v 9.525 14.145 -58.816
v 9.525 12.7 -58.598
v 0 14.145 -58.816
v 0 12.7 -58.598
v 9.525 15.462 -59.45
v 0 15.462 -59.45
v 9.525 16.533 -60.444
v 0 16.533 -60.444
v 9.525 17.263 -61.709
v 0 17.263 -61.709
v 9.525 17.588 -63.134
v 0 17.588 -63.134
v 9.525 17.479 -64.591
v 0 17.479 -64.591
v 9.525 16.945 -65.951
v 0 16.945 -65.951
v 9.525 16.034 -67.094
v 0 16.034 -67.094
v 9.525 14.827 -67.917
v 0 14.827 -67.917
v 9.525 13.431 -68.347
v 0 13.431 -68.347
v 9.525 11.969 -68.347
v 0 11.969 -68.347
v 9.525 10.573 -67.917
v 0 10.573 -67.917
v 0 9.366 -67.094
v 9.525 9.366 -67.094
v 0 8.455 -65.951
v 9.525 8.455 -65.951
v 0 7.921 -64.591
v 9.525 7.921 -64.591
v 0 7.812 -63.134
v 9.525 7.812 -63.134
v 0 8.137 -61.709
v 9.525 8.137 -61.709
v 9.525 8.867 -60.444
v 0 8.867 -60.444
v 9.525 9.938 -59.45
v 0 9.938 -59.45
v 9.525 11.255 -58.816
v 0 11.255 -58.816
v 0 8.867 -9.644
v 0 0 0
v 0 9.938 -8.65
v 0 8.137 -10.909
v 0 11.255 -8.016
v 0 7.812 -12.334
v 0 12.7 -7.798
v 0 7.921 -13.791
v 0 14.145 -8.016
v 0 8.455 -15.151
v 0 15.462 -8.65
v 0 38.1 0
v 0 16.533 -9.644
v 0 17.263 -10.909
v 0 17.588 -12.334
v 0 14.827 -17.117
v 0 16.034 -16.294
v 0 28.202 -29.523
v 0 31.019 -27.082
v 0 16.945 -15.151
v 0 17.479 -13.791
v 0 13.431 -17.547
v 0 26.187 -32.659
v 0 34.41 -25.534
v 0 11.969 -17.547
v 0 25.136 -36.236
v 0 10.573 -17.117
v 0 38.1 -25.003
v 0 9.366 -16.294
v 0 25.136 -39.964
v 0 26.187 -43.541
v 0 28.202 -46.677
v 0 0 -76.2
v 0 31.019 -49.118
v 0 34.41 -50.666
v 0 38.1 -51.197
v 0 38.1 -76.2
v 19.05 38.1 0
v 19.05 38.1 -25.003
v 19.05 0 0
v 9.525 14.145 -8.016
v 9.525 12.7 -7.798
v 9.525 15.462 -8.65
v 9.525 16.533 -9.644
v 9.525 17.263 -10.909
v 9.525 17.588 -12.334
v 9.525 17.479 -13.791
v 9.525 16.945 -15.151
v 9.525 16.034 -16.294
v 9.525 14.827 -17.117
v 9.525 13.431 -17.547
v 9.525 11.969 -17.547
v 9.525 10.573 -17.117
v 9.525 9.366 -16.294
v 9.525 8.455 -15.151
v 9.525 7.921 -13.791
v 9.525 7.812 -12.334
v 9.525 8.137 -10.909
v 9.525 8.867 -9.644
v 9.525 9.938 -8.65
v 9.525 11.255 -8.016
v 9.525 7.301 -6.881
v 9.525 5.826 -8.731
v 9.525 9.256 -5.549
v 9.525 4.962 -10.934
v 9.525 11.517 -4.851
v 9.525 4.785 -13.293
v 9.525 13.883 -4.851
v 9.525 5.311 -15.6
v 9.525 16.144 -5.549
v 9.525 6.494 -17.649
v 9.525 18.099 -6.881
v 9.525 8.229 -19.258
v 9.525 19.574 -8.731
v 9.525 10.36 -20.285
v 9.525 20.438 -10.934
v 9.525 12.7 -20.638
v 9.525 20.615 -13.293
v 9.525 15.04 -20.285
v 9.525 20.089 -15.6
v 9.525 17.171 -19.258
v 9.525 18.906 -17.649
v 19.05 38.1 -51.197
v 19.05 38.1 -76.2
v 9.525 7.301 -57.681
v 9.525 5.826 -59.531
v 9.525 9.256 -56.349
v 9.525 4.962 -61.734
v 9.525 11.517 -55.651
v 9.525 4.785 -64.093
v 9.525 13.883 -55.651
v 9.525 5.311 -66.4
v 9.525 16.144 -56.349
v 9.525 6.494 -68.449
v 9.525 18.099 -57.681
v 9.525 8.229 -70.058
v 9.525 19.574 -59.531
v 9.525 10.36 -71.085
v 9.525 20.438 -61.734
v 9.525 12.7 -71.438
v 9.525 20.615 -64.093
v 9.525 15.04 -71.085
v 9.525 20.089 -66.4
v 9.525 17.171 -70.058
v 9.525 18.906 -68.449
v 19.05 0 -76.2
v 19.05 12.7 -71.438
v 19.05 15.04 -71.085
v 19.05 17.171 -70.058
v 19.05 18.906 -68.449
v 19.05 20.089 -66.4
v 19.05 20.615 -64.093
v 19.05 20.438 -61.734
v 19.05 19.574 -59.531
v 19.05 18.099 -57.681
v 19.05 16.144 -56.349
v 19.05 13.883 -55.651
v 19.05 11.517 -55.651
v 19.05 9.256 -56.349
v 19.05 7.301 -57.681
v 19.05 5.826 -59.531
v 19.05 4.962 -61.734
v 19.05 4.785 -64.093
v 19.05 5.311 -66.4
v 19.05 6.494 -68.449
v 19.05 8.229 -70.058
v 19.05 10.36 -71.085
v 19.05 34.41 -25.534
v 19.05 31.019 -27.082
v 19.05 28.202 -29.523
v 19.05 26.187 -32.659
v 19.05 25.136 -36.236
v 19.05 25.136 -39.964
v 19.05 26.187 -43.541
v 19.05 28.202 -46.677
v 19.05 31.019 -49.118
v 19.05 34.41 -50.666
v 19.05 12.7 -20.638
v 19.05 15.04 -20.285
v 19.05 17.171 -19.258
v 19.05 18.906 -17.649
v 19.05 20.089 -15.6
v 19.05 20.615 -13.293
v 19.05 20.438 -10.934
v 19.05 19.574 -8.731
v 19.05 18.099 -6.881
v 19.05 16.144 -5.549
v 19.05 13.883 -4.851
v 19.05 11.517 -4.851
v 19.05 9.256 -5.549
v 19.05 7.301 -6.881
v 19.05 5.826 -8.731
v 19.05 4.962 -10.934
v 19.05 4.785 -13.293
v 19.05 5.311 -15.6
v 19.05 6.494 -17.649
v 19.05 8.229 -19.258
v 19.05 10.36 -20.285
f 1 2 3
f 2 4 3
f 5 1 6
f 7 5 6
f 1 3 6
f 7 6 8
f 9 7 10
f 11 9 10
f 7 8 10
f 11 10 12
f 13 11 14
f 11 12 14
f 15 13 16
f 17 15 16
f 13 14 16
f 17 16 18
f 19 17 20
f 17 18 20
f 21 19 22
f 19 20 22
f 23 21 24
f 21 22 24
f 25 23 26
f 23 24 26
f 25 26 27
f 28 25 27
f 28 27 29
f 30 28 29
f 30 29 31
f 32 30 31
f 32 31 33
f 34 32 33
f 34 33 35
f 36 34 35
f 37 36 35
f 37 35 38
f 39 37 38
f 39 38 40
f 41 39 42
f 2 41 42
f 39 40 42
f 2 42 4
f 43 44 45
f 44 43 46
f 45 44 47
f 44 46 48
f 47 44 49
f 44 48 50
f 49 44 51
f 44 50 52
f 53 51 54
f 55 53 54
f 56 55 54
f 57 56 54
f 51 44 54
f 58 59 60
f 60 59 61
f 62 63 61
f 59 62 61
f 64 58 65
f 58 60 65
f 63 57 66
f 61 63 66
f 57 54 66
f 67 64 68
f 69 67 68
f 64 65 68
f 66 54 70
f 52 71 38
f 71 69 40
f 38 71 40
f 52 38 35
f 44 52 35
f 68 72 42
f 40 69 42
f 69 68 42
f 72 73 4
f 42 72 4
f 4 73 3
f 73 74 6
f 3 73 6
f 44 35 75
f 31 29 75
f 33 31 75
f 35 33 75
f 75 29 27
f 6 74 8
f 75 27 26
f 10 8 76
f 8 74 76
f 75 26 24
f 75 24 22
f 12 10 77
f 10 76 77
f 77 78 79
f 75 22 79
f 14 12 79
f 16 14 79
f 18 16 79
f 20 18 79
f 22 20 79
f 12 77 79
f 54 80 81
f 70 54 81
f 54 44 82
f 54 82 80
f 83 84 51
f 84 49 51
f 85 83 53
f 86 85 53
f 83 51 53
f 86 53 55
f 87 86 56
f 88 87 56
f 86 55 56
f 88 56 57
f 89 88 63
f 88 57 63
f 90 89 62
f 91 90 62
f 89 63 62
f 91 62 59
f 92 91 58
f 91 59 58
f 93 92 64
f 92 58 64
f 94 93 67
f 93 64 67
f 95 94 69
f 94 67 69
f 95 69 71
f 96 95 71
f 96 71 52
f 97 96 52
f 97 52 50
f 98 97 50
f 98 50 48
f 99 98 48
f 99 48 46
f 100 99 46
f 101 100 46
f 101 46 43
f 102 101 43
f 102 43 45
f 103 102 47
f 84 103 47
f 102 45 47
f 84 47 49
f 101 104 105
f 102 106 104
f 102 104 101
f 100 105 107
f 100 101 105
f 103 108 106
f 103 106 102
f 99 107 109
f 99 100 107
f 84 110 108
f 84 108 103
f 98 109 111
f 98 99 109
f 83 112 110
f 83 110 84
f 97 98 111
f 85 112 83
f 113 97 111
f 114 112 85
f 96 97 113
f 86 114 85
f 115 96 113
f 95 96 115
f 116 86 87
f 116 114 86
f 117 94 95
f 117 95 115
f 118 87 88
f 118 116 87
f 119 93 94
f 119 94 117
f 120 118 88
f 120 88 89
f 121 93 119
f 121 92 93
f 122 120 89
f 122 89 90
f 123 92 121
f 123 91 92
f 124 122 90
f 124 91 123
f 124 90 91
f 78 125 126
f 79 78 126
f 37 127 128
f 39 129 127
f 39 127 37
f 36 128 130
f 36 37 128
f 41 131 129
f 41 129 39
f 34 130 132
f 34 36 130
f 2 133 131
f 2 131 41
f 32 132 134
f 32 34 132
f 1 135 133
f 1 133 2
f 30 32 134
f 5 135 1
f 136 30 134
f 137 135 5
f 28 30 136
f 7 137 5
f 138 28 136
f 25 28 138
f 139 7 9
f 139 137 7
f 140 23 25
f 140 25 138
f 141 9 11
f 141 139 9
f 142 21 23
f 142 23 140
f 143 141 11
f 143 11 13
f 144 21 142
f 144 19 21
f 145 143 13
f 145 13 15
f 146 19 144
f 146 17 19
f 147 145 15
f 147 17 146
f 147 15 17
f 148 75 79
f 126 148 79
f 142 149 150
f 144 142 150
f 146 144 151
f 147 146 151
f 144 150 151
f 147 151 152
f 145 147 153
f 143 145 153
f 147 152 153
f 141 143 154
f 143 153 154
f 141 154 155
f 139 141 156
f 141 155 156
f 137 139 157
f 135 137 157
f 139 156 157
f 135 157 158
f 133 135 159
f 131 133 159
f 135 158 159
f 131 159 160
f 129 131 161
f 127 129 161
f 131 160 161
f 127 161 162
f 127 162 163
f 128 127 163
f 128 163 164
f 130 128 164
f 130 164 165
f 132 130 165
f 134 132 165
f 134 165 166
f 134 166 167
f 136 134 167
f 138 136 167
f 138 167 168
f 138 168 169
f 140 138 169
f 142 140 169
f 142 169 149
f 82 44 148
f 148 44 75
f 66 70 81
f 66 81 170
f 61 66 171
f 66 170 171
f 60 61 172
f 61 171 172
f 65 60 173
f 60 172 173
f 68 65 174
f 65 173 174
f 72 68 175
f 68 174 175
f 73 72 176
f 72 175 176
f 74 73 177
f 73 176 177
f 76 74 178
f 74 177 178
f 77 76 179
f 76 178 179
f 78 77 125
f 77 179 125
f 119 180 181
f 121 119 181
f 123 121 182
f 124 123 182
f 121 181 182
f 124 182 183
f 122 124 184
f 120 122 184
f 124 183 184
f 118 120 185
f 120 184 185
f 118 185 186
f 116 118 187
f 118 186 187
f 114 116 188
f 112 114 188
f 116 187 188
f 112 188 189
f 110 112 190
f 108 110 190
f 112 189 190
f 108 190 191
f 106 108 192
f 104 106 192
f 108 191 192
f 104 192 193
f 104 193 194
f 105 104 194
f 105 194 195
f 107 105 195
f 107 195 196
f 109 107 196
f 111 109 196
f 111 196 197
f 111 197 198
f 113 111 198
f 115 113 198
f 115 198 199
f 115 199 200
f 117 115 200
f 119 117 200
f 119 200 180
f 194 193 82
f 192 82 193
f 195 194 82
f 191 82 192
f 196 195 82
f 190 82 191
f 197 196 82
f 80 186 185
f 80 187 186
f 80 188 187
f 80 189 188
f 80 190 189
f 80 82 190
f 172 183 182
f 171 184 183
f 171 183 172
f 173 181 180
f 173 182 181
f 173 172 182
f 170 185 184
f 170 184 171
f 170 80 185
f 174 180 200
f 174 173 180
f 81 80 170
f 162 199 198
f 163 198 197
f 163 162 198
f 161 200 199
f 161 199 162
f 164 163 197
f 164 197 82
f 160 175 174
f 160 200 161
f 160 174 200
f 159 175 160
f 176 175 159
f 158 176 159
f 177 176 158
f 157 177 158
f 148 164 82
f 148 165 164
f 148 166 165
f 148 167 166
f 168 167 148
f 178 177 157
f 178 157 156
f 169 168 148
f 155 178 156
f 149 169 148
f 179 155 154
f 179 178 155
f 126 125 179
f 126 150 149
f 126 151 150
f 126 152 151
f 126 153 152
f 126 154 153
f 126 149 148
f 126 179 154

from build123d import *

# Parameters (mm, degrees)
SKETCH1_W                                        = 76.2
SKETCH1_H                                        = 76.2
BOSS_EXTRUDE1_DEPTH                              = 19.05
SKETCH2_R                                        = 13.096875
CUT_EXTRUDE1_DEPTH                               = 110.433918417
CBORE_FOR_3_8_SOCKET_HEAD_CAP_SCREW1_D           = 9.8044
CBORE_FOR_3_8_SOCKET_HEAD_CAP_SCREW1_CBORE_D     = 15.875
CBORE_FOR_3_8_SOCKET_HEAD_CAP_SCREW1_CBORE_DEPTH = 9.525
SKETCH5_W                                        = 76.2
SKETCH5_H                                        = 38.1
CUT_EXTRUDE2_DEPTH                               = 110.433918417


with BuildPart() as part:
    # Sketch1 → Boss-Extrude1 (new body)
    with BuildSketch(Plane(origin=(0, 0, 0), x_dir=(0, 0, -1), z_dir=(1, 0, 0))):
        with Locations((38.1, 38.1)):
            Rectangle(SKETCH1_W, SKETCH1_H)
    extrude(amount=BOSS_EXTRUDE1_DEPTH)

    # Sketch2 → Cut-Extrude1 (cut, through all)
    with BuildSketch(Plane(origin=(19.05, 0, 0), x_dir=(0, 0, -1), z_dir=(1, 0, 0))):
        with Locations((38.1, 38.1)):
            Circle(SKETCH2_R)
    extrude(amount=-CUT_EXTRUDE1_DEPTH, mode=Mode.SUBTRACT)

    # CBORE for 3/8 Socket Head Cap Screw1 (through all)
    with Locations(Plane(origin=(19.05, 0, 0), x_dir=(0, 0, -1), z_dir=(1, 0, 0))):
        with Locations((12.7, 12.7), (63.5, 12.7)):
            CounterBoreHole(CBORE_FOR_3_8_SOCKET_HEAD_CAP_SCREW1_D / 2, CBORE_FOR_3_8_SOCKET_HEAD_CAP_SCREW1_CBORE_D / 2, CBORE_FOR_3_8_SOCKET_HEAD_CAP_SCREW1_CBORE_DEPTH)

    # Sketch5 → Cut-Extrude2 (cut, through all)
    with BuildSketch(Plane(origin=(19.05, 0, 0), x_dir=(0, 0, -1), z_dir=(1, 0, 0))):
        with Locations((38.1, 57.15)):
            Rectangle(SKETCH5_W, SKETCH5_H)
    extrude(amount=-CUT_EXTRUDE2_DEPTH, mode=Mode.SUBTRACT)


solid = part.part
